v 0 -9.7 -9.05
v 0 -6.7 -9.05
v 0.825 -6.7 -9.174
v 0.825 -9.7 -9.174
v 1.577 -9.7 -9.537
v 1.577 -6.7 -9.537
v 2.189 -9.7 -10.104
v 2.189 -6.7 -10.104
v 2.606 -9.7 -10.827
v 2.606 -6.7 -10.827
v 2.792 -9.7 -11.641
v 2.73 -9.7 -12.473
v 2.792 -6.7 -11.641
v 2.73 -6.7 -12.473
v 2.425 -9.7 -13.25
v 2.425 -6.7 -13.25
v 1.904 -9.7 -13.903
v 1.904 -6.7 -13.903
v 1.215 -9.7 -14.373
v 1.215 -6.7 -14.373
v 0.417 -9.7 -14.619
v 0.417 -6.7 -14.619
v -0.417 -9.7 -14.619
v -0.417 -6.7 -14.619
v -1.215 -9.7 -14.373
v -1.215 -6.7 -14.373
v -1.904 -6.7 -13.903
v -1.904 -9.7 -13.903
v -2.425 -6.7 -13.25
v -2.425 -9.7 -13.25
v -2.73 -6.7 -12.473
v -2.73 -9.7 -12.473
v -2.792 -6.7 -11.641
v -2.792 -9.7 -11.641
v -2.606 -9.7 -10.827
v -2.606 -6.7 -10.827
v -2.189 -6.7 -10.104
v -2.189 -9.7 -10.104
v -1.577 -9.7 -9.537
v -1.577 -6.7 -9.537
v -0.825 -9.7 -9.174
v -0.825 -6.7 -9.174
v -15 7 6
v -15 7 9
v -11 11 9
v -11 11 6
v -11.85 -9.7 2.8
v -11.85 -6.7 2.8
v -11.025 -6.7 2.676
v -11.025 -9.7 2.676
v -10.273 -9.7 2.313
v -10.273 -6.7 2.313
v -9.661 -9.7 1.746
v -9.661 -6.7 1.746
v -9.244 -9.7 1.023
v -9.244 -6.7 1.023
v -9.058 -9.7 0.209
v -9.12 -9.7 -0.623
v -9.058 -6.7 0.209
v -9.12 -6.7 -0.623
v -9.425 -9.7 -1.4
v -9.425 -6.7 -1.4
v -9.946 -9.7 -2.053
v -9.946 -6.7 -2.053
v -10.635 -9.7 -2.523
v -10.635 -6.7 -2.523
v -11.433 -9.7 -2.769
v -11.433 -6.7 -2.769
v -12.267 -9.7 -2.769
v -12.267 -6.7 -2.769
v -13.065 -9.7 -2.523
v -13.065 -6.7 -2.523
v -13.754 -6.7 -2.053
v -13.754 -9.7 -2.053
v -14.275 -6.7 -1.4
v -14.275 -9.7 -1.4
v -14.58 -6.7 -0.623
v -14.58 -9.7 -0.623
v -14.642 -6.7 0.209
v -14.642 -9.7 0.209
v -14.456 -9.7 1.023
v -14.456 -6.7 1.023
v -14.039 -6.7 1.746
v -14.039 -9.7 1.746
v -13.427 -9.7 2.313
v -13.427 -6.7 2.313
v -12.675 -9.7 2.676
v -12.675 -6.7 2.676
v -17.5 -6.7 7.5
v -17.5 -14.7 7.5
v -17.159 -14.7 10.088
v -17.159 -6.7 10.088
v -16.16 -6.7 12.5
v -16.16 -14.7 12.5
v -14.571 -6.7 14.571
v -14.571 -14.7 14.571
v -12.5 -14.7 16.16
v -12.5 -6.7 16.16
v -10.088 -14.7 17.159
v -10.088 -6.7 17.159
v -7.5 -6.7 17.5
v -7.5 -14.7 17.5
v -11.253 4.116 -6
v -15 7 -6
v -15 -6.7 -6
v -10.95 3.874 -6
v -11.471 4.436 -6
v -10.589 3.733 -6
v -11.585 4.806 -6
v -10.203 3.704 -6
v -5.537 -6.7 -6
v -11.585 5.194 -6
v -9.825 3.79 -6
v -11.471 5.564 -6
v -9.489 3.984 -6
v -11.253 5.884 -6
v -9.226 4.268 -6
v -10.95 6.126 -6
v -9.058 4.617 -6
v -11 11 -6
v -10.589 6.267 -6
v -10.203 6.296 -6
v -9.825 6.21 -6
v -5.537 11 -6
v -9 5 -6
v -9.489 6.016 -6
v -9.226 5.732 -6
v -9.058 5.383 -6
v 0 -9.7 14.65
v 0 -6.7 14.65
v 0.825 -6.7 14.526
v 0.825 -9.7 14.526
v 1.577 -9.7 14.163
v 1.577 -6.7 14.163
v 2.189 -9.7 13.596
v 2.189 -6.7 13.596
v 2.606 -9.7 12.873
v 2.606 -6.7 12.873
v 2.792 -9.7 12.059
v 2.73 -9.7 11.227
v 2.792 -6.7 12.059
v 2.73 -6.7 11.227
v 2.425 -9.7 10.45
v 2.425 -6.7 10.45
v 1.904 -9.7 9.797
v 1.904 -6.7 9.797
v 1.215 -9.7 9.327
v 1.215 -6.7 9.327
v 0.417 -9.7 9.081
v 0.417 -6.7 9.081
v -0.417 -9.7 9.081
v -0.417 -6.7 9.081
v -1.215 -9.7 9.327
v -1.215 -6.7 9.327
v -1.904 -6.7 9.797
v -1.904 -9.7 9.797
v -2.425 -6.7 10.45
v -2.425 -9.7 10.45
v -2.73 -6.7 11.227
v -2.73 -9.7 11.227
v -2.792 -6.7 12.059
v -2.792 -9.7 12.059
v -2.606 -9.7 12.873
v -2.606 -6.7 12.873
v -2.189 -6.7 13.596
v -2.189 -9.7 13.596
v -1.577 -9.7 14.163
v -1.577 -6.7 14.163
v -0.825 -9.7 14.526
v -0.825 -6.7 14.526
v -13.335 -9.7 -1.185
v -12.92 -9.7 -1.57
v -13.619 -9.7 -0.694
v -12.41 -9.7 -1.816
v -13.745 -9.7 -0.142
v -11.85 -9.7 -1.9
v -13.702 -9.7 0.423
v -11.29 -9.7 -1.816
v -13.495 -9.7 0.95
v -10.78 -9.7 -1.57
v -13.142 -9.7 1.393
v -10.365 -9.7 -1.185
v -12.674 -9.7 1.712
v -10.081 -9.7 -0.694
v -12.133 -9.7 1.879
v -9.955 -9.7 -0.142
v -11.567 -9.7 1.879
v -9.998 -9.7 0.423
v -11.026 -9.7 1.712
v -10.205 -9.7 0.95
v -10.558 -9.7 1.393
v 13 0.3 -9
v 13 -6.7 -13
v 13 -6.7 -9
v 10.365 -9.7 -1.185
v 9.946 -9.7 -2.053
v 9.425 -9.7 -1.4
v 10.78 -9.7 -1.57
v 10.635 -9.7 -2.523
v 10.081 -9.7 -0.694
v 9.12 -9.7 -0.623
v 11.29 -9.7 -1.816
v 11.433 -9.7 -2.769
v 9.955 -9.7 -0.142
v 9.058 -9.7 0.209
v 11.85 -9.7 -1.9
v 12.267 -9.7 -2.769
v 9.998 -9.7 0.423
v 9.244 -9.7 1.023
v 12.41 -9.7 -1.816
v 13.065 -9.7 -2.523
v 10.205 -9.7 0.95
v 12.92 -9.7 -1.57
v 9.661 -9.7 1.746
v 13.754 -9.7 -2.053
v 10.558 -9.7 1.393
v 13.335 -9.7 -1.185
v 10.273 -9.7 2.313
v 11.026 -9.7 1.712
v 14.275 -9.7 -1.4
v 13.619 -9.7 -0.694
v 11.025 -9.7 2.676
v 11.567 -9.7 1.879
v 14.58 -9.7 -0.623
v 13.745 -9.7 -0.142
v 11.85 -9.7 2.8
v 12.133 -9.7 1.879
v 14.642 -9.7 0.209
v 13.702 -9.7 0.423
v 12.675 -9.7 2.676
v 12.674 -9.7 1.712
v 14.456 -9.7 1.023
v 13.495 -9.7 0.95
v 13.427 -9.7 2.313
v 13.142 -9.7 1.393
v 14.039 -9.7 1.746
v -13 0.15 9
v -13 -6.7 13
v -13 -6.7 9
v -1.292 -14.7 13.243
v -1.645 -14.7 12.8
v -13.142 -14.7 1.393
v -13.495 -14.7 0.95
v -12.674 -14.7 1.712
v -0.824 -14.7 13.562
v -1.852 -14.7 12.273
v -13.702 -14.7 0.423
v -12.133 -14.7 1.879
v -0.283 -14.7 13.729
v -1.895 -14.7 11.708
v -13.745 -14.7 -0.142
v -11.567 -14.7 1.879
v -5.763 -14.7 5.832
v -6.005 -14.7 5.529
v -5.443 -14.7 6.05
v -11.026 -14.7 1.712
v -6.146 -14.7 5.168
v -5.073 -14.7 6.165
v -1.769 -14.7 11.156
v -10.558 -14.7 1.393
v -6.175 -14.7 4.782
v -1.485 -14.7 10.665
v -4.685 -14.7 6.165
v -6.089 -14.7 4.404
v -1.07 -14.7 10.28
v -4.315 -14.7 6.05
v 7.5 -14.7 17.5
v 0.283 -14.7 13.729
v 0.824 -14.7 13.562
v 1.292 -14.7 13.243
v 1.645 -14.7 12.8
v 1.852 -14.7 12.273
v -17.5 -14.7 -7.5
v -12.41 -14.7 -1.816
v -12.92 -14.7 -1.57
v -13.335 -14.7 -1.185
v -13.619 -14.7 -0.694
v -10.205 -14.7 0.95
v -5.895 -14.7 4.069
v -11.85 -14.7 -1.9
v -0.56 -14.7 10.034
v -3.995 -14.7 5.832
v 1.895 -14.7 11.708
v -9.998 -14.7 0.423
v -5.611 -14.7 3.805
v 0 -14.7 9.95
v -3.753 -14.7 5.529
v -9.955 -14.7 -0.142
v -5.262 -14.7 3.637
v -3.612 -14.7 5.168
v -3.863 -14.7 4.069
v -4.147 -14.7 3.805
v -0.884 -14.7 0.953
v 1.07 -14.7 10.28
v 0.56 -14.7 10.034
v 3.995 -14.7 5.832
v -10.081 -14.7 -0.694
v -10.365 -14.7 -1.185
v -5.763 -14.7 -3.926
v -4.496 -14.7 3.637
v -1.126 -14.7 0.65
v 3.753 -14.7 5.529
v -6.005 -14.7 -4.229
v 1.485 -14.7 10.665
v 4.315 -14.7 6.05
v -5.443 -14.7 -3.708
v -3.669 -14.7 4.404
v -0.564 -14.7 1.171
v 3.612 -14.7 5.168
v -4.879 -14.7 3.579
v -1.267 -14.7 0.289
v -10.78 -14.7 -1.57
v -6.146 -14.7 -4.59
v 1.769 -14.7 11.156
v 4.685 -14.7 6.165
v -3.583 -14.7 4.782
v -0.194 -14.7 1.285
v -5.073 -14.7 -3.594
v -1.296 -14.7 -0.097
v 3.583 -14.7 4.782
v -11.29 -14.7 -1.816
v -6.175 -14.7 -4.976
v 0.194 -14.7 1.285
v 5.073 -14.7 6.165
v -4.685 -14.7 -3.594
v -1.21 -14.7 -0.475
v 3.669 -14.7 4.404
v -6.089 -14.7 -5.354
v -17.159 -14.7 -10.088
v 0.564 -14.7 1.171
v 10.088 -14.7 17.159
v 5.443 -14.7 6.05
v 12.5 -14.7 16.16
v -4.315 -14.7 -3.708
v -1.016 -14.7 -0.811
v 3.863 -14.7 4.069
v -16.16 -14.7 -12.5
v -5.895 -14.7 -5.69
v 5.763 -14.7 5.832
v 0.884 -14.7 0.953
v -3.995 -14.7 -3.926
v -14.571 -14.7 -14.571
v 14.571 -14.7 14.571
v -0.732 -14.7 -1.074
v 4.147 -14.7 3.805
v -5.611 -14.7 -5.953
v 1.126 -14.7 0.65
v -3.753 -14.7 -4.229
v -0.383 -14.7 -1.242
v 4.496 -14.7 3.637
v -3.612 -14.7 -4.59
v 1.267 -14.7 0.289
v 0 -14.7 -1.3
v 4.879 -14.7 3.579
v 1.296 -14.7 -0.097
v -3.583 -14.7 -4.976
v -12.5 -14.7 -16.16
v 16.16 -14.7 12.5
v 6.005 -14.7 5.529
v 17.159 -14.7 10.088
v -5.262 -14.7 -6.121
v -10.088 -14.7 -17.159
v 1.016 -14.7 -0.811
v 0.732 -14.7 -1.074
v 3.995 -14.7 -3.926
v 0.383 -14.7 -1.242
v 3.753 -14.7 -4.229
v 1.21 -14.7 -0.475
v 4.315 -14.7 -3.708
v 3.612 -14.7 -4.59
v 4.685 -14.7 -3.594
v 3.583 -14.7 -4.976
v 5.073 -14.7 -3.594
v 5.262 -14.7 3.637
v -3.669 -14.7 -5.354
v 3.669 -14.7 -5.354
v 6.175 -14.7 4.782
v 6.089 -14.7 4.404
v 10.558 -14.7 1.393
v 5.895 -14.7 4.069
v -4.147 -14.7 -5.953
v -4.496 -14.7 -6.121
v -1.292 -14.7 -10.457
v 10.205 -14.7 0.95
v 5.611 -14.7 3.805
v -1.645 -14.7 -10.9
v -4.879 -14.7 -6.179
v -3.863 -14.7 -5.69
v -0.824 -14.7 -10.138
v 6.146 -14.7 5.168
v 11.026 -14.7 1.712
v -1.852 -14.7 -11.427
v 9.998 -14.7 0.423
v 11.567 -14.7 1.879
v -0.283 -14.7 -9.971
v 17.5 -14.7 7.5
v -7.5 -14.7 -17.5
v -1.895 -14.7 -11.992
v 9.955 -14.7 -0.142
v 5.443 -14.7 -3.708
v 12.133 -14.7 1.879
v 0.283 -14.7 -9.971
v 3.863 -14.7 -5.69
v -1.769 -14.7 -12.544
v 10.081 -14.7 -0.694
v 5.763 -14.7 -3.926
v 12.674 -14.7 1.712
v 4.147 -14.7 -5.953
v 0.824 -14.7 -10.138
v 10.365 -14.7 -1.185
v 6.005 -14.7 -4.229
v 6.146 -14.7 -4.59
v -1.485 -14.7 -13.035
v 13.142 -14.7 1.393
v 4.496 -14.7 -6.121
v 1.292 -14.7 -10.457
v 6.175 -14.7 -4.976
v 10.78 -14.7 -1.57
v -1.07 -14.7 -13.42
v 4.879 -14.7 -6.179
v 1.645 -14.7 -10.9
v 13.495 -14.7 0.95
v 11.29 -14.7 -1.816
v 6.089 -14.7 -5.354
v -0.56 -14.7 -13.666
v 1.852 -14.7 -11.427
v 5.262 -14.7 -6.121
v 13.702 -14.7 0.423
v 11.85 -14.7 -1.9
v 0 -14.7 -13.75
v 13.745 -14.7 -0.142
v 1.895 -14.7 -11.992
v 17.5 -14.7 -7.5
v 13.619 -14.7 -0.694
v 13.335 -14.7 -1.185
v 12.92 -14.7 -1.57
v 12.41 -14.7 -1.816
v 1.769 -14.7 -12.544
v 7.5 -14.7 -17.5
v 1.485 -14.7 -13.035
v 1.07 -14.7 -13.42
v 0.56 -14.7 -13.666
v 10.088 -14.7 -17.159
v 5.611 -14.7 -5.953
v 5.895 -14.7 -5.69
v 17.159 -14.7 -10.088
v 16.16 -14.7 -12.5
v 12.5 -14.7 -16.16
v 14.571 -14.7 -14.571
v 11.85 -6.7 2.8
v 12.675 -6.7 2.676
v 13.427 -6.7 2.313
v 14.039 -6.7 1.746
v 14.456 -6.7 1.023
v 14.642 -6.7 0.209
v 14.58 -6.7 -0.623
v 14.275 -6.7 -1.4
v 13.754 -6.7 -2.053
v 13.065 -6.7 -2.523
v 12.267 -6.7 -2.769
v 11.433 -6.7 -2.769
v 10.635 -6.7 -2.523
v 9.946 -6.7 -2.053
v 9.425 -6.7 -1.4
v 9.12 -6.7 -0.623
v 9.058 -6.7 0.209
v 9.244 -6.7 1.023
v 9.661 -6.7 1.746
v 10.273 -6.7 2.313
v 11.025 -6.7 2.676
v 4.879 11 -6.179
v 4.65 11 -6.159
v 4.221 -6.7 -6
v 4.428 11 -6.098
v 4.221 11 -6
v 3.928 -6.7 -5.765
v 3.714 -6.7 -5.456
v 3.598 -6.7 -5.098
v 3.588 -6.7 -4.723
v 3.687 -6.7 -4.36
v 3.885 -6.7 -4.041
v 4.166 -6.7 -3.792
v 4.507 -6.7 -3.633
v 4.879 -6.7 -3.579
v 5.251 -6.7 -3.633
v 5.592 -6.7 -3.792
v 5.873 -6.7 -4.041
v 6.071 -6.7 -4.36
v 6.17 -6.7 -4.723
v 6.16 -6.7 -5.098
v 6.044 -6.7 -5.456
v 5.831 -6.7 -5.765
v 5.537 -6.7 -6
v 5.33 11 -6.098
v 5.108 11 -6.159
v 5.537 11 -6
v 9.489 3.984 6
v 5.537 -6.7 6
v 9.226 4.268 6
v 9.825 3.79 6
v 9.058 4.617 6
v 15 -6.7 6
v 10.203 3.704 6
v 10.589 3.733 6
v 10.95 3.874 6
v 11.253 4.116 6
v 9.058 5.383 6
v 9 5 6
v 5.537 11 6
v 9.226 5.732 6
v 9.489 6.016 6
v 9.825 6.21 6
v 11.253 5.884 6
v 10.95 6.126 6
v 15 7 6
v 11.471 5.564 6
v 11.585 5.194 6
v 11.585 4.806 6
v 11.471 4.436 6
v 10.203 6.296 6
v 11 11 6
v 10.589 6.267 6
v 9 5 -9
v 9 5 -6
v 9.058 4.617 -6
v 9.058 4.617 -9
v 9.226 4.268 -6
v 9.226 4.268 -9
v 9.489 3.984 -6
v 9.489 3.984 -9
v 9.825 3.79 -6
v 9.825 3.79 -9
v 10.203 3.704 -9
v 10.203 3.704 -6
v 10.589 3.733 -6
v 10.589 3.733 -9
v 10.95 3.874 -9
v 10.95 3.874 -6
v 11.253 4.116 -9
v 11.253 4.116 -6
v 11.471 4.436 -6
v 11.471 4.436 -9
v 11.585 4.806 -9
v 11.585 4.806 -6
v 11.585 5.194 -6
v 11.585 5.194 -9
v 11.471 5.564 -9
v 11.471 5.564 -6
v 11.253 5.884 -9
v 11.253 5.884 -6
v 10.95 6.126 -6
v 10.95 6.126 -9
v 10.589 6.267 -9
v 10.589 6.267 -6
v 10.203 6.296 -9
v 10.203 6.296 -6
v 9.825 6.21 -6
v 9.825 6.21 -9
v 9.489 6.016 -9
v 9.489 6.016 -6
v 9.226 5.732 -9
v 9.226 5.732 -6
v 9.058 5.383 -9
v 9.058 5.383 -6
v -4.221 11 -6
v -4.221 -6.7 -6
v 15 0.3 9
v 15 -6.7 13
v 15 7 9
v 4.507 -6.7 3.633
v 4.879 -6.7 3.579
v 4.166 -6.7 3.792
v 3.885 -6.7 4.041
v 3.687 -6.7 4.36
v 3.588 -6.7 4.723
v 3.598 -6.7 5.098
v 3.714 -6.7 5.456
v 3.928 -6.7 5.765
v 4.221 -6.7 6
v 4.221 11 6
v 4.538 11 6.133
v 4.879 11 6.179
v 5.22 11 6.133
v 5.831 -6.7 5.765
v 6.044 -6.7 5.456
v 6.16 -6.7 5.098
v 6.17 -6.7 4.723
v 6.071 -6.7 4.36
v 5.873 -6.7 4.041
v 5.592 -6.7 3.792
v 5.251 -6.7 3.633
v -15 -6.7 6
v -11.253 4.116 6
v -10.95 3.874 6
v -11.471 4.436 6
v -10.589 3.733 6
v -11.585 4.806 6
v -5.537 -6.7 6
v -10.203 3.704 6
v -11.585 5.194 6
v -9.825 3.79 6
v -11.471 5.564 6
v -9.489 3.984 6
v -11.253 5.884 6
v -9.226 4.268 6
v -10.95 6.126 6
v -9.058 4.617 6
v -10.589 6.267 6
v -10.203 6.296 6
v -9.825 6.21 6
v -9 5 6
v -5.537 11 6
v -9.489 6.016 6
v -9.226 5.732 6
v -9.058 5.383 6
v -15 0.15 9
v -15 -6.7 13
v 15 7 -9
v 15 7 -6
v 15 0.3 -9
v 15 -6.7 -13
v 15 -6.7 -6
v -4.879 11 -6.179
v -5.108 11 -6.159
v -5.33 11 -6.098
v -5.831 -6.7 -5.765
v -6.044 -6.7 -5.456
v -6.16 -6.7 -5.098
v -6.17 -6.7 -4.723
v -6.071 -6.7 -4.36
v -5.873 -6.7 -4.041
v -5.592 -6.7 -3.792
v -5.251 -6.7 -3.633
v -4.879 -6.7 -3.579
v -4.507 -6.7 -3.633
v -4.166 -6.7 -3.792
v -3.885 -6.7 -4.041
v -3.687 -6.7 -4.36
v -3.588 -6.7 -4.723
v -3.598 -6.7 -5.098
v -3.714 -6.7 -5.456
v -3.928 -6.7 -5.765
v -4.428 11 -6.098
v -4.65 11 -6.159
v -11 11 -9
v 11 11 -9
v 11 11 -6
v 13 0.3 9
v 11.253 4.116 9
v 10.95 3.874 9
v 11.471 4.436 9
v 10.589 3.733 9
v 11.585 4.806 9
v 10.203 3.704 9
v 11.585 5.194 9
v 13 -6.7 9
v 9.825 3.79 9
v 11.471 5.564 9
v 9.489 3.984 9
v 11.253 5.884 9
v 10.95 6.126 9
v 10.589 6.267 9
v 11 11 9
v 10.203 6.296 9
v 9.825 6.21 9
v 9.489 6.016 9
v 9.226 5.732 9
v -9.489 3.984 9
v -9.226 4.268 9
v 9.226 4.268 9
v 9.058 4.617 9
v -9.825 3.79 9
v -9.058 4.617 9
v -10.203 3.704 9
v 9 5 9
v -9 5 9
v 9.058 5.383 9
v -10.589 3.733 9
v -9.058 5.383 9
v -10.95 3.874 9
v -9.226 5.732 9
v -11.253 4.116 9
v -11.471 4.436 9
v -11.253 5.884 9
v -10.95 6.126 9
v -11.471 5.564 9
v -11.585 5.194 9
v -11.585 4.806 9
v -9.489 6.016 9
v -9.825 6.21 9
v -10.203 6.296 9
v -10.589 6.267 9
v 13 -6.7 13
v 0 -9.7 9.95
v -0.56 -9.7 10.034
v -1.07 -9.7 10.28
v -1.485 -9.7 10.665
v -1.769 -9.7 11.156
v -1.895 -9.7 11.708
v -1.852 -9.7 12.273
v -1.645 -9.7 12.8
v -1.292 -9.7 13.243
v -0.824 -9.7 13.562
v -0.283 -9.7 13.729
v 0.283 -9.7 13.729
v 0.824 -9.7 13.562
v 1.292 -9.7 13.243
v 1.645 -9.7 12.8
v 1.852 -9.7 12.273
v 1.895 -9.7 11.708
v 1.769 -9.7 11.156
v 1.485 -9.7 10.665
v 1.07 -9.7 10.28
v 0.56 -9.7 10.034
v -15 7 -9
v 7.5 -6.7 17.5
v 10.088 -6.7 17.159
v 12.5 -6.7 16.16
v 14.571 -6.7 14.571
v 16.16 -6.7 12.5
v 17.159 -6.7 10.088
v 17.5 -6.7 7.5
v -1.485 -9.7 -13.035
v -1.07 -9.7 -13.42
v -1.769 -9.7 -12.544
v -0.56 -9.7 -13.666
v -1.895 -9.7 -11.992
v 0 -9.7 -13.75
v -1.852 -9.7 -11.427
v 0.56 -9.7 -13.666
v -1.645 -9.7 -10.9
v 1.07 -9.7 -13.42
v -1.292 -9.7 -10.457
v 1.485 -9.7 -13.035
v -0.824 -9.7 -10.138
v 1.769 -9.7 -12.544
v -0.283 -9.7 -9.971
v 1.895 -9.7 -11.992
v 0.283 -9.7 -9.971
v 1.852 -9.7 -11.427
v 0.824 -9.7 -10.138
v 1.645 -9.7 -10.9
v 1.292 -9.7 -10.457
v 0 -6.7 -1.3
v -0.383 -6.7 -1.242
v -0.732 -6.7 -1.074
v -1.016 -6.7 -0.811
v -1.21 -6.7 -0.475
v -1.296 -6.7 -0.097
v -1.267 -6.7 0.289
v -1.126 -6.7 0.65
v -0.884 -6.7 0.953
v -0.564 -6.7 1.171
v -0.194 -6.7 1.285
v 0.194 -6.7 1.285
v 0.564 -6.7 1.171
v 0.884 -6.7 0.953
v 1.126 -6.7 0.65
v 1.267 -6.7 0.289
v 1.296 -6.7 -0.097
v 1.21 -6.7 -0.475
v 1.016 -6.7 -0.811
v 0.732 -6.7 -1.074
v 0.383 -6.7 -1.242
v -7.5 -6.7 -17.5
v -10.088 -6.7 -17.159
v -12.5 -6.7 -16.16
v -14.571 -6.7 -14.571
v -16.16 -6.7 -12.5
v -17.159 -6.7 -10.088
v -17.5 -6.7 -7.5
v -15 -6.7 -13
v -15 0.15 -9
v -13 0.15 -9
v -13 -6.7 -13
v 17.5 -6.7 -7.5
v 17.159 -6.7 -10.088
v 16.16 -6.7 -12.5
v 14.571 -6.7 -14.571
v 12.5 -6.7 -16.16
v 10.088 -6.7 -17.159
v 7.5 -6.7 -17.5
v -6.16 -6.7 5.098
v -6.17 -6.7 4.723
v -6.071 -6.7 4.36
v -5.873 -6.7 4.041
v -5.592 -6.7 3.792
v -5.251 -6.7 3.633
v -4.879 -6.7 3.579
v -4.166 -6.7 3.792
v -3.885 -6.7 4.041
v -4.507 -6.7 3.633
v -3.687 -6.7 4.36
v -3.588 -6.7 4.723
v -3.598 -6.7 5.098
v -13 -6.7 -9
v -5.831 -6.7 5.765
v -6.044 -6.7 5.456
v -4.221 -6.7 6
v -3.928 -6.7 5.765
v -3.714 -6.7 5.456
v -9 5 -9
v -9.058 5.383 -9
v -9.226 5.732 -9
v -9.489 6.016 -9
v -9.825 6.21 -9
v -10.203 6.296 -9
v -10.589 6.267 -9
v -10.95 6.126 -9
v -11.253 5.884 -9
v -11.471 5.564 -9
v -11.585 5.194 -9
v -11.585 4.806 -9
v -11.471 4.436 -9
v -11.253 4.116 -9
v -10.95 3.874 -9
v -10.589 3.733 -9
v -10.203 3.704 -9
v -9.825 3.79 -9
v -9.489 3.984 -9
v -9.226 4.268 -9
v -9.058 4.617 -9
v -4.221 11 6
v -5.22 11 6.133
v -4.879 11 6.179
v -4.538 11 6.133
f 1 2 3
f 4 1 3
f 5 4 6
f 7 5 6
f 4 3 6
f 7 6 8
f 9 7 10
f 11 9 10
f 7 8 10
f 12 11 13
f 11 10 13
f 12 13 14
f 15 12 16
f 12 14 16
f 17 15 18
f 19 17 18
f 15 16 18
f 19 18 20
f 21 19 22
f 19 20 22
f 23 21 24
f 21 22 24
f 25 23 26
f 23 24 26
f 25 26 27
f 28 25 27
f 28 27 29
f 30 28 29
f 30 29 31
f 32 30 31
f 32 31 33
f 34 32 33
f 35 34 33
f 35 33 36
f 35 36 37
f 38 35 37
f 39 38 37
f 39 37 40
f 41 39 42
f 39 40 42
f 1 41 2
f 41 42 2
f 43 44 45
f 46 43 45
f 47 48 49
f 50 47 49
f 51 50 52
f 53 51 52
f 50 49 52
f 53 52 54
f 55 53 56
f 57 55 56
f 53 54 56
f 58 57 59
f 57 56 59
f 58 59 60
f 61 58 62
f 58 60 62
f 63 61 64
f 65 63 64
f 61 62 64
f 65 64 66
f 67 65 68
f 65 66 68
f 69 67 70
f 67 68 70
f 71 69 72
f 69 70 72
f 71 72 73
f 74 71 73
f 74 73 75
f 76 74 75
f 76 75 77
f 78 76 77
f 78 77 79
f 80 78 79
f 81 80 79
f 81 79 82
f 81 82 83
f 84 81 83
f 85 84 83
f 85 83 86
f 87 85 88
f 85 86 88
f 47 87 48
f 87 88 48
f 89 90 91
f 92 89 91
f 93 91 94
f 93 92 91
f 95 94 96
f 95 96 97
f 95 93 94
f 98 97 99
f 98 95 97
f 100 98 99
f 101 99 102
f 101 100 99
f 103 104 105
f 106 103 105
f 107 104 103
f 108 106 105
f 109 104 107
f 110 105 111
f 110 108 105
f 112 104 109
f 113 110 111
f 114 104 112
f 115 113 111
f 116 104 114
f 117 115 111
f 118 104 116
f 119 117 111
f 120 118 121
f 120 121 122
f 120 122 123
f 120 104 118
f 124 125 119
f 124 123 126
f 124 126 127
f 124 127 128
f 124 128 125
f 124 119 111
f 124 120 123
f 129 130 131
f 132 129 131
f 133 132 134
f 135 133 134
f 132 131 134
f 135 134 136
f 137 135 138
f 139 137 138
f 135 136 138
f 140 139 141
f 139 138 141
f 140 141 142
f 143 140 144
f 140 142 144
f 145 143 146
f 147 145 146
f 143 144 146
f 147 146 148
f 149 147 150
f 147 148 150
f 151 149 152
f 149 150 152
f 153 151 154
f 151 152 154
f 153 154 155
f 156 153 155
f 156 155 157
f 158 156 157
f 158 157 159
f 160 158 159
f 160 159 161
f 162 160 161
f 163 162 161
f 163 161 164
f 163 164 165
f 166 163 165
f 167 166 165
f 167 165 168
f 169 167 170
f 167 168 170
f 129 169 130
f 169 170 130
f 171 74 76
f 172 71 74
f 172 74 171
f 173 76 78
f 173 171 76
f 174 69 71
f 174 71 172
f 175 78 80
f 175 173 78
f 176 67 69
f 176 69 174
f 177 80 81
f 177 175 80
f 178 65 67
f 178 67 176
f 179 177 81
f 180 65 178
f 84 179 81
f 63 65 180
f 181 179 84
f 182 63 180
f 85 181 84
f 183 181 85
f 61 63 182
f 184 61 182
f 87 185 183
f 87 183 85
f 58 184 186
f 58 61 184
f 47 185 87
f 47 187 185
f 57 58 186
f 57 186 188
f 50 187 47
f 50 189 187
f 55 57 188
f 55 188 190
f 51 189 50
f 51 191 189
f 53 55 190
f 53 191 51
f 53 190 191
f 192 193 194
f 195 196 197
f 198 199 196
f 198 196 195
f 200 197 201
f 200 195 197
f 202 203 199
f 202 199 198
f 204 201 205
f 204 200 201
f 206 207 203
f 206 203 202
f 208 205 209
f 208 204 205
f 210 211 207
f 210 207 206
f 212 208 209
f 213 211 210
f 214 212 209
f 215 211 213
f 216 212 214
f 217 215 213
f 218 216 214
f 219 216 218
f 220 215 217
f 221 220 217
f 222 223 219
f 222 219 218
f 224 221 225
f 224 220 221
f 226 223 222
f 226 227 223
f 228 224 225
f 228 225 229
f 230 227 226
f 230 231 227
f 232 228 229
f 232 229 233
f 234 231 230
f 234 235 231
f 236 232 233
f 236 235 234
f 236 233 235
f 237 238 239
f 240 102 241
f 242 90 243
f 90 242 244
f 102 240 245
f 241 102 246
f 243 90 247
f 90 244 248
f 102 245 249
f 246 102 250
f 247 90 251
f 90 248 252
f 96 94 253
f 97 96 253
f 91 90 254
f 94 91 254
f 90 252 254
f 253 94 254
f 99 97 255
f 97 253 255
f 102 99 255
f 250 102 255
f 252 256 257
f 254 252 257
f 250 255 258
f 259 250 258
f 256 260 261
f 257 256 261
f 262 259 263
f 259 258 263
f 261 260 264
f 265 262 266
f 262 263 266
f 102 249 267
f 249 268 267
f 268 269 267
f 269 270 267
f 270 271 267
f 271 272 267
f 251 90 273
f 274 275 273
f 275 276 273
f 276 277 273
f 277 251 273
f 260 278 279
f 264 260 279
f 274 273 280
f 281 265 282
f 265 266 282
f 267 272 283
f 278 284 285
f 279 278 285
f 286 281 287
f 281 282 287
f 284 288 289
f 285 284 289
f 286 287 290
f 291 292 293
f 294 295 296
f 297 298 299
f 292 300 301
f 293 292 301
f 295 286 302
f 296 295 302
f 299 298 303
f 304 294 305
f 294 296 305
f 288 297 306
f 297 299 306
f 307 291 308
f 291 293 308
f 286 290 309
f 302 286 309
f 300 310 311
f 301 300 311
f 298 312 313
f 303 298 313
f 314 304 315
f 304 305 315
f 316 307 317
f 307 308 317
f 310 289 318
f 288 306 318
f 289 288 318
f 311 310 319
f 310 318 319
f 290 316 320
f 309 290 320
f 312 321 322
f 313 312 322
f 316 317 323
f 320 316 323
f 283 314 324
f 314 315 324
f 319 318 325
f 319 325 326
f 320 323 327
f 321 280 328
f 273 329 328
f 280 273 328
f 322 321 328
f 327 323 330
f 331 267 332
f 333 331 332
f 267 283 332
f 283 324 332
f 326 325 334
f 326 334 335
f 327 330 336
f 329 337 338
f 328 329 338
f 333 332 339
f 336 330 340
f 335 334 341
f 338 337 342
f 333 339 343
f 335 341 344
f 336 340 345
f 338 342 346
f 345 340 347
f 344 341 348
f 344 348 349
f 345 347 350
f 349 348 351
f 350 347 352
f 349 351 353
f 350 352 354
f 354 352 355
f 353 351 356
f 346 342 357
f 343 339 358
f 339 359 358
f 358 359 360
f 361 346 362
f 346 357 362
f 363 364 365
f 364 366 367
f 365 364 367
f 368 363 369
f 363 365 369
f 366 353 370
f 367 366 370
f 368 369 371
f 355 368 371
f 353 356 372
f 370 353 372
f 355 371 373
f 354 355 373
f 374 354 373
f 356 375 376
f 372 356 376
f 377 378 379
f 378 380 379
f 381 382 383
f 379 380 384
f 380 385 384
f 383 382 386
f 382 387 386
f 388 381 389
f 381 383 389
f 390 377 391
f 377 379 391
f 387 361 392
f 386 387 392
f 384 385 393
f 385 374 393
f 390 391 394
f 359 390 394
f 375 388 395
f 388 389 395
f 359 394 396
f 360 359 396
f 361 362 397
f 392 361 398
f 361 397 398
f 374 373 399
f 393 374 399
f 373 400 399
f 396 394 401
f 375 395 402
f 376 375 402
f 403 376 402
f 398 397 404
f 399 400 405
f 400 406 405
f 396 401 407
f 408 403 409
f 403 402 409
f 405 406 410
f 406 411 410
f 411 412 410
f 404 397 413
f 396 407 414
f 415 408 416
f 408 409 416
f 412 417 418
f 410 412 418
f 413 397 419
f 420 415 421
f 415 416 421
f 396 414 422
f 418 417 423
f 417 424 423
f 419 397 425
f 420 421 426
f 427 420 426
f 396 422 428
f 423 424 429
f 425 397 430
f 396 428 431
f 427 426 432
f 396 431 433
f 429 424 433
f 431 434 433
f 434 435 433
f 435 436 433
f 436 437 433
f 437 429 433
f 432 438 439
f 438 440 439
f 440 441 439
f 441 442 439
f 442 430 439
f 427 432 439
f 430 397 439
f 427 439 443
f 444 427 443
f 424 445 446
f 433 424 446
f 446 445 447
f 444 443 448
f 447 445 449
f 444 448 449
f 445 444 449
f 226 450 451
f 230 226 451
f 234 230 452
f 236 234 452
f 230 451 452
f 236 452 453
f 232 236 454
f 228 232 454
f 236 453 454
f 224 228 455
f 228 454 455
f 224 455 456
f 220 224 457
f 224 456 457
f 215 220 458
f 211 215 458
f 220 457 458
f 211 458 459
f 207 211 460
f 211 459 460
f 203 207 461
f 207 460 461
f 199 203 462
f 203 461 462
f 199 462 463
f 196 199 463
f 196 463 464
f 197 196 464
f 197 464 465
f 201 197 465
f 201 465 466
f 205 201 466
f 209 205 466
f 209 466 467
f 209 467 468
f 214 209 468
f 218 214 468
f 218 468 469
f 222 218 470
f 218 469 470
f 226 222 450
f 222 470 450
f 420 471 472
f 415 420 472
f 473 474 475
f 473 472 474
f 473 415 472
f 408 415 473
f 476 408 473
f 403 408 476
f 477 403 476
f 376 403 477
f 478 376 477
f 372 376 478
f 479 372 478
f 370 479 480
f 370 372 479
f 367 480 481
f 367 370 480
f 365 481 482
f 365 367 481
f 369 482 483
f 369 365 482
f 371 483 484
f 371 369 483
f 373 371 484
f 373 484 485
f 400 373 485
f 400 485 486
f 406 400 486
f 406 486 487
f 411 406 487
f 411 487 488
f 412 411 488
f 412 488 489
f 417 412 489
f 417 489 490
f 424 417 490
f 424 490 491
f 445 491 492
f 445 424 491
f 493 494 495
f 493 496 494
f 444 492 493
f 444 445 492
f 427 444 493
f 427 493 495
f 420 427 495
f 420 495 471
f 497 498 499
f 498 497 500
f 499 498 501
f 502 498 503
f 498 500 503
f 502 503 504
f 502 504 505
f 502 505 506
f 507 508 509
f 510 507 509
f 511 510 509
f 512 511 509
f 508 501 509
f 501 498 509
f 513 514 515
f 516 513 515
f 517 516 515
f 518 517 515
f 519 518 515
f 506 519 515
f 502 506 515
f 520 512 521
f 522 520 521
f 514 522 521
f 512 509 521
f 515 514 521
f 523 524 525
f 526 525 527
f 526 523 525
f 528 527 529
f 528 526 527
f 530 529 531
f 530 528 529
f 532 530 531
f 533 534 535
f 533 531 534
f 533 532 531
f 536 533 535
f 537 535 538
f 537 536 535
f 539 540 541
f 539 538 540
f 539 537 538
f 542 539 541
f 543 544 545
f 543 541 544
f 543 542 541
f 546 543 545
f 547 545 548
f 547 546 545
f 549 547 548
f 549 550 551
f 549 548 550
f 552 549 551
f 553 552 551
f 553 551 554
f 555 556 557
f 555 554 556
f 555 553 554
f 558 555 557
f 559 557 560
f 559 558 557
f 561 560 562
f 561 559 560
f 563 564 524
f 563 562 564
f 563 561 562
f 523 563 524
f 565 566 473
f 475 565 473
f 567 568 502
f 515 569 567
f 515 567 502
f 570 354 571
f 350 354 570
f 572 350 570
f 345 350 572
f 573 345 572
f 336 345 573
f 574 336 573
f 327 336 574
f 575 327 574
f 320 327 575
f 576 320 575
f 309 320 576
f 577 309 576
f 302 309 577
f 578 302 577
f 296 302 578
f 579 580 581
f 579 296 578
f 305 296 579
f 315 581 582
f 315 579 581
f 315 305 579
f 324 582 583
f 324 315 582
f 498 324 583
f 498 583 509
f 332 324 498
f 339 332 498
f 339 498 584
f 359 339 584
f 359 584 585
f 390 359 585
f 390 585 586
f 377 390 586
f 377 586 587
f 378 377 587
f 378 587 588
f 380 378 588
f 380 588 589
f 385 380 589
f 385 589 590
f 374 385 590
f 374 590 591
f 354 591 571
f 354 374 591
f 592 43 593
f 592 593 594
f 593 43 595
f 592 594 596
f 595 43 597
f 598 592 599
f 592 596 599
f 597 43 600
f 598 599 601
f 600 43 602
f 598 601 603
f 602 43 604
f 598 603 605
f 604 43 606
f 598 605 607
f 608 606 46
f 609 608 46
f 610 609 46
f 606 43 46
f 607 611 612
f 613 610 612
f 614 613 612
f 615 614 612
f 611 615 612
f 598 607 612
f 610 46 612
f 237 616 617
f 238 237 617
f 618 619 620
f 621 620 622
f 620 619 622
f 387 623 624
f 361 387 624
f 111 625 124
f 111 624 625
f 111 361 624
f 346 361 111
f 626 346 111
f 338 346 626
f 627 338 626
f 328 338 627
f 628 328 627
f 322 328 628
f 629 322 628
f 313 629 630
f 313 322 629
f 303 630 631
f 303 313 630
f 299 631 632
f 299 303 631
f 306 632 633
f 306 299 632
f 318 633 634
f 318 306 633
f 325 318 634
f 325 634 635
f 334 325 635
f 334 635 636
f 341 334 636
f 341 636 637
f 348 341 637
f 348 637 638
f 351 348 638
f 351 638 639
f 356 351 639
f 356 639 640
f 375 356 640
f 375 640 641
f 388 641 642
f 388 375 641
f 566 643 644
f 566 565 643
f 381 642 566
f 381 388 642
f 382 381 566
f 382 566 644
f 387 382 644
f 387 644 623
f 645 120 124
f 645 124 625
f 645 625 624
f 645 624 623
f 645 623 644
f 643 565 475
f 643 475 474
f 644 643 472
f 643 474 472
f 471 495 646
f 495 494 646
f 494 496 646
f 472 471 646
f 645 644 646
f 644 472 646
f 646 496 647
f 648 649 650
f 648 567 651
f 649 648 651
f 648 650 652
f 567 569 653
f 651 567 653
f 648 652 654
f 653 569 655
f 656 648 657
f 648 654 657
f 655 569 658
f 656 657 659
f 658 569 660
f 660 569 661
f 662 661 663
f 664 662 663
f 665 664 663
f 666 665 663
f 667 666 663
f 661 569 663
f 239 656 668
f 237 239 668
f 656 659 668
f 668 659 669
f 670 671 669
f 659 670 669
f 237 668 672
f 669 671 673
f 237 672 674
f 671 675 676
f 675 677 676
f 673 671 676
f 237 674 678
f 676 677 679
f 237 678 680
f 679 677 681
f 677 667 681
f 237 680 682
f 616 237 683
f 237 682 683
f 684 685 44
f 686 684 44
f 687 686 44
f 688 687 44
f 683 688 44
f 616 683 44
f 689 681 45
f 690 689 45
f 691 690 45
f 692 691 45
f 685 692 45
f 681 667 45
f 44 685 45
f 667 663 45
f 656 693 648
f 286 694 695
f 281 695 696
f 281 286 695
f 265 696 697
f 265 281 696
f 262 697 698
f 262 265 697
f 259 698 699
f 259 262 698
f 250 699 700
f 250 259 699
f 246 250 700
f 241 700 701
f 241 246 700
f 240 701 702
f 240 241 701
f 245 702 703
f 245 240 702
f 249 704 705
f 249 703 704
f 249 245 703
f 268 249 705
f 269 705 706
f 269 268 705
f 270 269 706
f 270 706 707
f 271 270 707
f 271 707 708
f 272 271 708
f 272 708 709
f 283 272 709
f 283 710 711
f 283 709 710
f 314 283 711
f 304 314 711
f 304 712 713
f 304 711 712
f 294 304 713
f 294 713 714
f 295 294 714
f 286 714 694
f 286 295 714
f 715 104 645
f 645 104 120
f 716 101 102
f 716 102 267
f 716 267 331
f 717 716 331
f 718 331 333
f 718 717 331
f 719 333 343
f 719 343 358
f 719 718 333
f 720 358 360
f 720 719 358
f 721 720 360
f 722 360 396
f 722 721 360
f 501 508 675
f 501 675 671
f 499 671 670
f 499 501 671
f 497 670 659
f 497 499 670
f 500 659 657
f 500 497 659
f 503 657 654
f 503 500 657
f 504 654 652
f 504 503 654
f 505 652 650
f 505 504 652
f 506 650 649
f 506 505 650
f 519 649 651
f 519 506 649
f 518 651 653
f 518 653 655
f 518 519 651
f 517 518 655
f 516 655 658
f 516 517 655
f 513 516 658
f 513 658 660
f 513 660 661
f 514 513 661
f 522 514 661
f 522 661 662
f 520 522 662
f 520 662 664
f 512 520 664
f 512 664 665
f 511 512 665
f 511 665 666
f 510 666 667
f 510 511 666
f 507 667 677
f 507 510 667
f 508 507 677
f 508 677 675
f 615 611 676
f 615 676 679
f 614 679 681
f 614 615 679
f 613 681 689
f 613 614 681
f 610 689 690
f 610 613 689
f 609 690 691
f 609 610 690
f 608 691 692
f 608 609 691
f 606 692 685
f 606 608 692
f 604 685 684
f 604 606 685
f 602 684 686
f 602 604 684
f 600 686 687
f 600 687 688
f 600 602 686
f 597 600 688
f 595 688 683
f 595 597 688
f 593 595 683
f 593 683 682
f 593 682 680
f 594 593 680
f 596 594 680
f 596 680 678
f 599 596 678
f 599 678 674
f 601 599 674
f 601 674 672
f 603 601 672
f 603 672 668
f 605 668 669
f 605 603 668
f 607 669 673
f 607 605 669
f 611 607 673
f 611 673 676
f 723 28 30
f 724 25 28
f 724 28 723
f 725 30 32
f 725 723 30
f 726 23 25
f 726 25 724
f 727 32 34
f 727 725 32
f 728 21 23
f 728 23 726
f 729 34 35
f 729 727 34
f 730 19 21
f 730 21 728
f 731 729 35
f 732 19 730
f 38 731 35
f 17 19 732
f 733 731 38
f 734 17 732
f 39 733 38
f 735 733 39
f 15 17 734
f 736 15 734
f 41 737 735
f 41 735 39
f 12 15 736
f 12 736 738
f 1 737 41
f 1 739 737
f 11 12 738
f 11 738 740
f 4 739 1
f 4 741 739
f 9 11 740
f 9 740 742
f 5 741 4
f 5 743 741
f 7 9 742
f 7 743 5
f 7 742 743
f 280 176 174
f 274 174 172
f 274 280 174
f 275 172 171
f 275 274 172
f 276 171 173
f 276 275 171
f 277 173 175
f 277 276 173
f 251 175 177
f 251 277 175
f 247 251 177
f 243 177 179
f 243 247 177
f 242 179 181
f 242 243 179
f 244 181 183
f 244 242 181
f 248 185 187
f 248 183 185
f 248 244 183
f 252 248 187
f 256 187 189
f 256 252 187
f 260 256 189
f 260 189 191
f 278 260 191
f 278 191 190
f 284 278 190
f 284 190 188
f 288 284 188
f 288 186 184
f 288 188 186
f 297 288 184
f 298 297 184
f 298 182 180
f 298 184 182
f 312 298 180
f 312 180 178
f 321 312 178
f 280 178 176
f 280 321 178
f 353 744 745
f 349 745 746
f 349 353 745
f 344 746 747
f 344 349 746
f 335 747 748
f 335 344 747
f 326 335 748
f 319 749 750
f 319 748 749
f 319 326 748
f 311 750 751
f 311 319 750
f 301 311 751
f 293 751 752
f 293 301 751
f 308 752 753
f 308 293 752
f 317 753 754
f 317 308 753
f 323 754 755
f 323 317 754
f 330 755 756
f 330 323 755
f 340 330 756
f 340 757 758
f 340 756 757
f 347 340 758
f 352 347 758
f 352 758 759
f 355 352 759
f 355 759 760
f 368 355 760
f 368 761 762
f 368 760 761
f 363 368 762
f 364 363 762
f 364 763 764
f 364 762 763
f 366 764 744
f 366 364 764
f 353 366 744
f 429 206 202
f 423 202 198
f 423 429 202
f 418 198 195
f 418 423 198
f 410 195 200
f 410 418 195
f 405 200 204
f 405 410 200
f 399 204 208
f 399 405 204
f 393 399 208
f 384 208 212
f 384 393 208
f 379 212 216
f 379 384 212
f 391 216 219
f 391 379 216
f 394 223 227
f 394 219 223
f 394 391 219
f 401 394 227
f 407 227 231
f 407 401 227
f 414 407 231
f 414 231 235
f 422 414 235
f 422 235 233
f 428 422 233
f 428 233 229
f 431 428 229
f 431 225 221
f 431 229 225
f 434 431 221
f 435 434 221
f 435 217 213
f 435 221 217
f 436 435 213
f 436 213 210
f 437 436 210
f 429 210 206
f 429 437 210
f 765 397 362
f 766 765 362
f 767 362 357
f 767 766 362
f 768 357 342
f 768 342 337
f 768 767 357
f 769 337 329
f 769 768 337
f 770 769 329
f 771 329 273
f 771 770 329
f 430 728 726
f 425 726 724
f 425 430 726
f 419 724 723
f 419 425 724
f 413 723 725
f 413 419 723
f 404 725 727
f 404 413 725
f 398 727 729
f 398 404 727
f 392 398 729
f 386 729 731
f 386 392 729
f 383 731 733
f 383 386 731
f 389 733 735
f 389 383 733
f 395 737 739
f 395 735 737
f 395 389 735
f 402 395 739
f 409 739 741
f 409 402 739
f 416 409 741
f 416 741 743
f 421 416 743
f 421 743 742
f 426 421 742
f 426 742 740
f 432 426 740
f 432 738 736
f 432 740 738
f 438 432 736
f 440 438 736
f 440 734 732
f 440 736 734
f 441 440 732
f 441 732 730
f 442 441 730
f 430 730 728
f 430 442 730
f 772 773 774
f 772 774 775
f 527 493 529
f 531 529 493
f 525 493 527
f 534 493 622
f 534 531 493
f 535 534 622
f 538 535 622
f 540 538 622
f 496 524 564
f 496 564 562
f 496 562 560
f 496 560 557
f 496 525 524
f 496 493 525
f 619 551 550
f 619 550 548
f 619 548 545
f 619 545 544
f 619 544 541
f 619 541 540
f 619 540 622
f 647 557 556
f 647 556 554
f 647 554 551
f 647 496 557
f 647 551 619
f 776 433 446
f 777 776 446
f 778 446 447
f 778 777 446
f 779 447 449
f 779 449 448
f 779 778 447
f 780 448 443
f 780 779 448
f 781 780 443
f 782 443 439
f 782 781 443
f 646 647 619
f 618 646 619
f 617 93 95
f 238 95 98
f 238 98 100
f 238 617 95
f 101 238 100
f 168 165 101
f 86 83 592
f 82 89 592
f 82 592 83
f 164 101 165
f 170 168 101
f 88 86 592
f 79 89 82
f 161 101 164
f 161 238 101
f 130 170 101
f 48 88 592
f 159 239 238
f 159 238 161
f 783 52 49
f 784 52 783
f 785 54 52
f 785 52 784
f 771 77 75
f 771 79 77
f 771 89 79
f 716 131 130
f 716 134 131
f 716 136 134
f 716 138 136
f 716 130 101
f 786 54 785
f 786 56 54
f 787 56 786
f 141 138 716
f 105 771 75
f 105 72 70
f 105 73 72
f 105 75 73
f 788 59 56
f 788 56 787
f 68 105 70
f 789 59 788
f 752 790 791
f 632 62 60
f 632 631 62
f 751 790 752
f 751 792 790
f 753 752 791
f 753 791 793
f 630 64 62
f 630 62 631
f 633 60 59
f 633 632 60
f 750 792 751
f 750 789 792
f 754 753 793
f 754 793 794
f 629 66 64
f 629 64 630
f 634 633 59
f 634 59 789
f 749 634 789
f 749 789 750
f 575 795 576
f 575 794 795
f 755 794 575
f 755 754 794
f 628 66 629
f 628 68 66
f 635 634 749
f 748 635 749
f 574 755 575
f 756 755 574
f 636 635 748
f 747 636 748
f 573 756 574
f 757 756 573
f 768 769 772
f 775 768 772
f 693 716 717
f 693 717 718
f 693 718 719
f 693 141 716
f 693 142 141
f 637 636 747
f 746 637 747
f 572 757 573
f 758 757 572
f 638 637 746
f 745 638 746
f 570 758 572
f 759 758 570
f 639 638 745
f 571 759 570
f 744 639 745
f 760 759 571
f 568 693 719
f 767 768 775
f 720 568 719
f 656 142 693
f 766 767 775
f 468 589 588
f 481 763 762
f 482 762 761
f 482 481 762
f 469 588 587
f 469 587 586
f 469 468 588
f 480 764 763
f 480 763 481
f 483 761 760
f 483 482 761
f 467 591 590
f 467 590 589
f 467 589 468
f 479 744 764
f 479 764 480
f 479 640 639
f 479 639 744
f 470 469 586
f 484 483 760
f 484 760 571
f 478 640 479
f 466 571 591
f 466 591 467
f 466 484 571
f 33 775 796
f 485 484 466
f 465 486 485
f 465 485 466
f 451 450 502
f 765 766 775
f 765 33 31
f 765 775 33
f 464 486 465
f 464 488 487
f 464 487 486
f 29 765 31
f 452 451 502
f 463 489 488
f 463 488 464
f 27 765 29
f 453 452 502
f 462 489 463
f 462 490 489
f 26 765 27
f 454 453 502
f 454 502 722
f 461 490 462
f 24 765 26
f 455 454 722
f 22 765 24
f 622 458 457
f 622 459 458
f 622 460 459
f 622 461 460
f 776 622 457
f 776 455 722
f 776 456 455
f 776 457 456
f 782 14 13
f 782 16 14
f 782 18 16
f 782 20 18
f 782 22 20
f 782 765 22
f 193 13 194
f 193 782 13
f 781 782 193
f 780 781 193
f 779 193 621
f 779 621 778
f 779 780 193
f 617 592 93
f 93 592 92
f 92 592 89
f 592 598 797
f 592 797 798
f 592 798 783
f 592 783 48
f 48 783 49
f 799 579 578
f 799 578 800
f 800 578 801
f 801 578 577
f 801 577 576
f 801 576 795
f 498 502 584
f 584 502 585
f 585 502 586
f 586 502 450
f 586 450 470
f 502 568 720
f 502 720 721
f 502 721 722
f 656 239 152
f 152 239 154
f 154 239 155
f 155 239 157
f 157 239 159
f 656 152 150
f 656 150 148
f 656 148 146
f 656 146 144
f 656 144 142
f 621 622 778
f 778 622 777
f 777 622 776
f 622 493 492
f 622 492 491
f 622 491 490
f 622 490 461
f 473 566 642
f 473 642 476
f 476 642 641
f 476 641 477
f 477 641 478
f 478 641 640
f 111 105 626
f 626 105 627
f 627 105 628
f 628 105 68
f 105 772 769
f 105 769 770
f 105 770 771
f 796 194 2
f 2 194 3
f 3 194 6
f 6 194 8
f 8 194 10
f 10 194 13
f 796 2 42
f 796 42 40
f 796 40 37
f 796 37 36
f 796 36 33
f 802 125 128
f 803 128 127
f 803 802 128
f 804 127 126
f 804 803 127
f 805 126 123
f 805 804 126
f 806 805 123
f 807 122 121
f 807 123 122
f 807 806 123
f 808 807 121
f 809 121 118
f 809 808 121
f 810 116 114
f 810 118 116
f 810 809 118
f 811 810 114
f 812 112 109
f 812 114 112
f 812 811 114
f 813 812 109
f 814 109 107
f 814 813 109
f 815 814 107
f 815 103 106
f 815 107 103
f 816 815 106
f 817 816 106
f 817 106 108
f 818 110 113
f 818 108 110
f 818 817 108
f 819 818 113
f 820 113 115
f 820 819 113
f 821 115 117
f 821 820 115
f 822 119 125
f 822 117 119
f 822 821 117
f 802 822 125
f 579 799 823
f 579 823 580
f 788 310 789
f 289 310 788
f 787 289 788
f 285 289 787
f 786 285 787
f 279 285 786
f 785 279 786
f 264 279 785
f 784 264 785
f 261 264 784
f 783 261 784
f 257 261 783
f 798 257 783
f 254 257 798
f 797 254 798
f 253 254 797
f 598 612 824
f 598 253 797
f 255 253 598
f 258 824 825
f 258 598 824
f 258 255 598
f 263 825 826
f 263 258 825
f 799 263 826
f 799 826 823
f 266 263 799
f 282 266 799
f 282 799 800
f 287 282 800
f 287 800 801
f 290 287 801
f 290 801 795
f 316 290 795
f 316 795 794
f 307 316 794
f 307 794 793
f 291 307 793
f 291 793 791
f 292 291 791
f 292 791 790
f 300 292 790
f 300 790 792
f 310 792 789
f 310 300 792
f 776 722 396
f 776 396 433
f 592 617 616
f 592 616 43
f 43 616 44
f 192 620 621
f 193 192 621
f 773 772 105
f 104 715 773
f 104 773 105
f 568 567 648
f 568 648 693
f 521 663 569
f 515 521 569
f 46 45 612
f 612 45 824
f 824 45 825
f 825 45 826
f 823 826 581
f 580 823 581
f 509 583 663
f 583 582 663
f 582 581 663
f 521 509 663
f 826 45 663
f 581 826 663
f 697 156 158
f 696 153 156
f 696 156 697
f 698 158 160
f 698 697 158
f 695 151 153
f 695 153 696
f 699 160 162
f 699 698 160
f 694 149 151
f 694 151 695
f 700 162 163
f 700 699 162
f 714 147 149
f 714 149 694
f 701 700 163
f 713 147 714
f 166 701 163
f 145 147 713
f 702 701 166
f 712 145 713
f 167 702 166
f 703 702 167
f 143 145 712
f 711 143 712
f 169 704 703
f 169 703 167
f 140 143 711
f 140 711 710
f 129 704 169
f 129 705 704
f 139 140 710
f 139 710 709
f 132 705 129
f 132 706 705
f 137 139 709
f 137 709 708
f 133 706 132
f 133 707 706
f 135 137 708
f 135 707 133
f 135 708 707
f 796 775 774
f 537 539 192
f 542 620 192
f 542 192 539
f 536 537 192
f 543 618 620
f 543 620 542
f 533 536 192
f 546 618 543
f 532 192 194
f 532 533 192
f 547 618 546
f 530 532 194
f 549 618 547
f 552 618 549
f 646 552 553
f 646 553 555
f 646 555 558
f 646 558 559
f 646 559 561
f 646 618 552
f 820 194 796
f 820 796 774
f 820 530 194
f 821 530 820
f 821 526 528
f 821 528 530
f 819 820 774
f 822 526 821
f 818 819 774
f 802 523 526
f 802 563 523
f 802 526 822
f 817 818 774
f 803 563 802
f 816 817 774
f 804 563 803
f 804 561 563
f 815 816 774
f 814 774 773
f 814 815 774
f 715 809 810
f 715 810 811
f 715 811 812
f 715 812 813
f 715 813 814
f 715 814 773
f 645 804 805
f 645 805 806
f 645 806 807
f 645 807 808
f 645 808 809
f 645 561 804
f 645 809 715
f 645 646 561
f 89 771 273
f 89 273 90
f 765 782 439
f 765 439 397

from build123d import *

# Parameters (mm, degrees)
SKETCH_2_R          = 1.3
EXTRUDE_1_DEPTH     = 9
SKETCH_3_W          = 30
SKETCH_3_H          = 20.835575778
CUT_EXTRUDE_1_DEPTH = 6
EXTRUDE_START       = -6.7
EXTRUDE_2_DEPTH     = 8
CUT_EXTRUDE_START   = -14.7
SKETCH_5_R          = 1.3
SKETCH_5_R_2        = 1.9
CUT_EXTRUDE_2_DEPTH = 30
EXTRUDE_3_DEPTH     = 2
EXTRUDE_4_DEPTH     = 2
SKETCH_11_R         = 2.8
CUT_EXTRUDE_3_DEPTH = 3


with BuildPart() as part:
    # 草图2 → 凸台-拉伸1 (new, symmetric)
    with BuildSketch(Plane.XY):
        Polygon((-11, 11), (11, 11), (15, 7), (15, -11), (-15, -11), (-15, 7), align=None)
        with Locations((-10.3, 5)):
            Circle(SKETCH_2_R, mode=Mode.SUBTRACT)
        with Locations(Location((10.3, 5, 0), (0, 0, 180))):
            Circle(SKETCH_2_R, mode=Mode.SUBTRACT)
    extrude(amount=EXTRUDE_1_DEPTH, both=True)

    # 草图3 → 切除-拉伸1 (cut, symmetric)
    with BuildSketch(Plane.XY):
        with Locations((0, 3.717787889)):
            Rectangle(SKETCH_3_W, SKETCH_3_H)
    extrude(amount=CUT_EXTRUDE_1_DEPTH, both=True, mode=Mode.SUBTRACT)

    # 草图6 → 凸台-拉伸2 (add)
    with BuildSketch(Plane(origin=(0, 0, 0), x_dir=(1, 0, 0), z_dir=(0, 1, 0)).offset(EXTRUDE_START)):
        with BuildLine():
            Line((-7.5, -17.5), (7.5, -17.5))
            ThreePointArc((7.5, -17.5), (14.571067812, -14.571067812), (17.5, -7.5))
            Line((17.5, -7.5), (17.5, 7.5))
            ThreePointArc((17.5, 7.5), (14.571067812, 14.571067812), (7.5, 17.5))
            Line((7.5, 17.5), (-7.5, 17.5))
            ThreePointArc((-7.5, 17.5), (-14.571067812, 14.571067812), (-17.5, 7.5))
            Line((-17.5, 7.5), (-17.5, -7.5))
            ThreePointArc((-17.5, -7.5), (-14.571067812, -14.571067812), (-7.5, -17.5))
        make_face()
    extrude(amount=-EXTRUDE_2_DEPTH)

    # 草图5 → 切除-拉伸2 (cut)
    with BuildSketch(Plane(origin=(0, 0, 0), x_dir=(1, 0, 0), z_dir=(0, 1, 0)).offset(CUT_EXTRUDE_START)):
        with Locations(Location((0, 0, 0), (0, 0, 90))):
            Circle(SKETCH_5_R)
        with Locations(Location((-4.87903679, 4.87903679, 0), (0, 0, 90))):
            Circle(SKETCH_5_R)
        with Locations(Location((-11.85, 0, 0), (0, 0, 90))):
            Circle(SKETCH_5_R_2)
        with Locations(Location((0, 11.85, 0), (0, 0, 90))):
            Circle(SKETCH_5_R_2)
        with Locations(Location((4.87903679, 4.87903679, 0), (0, 0, 90))):
            Circle(SKETCH_5_R)
        with Locations(Location((11.85, 0, 0), (0, 0, 90))):
            Circle(SKETCH_5_R_2)
        with Locations(Location((4.87903679, -4.87903679, 0), (0, 0, 90))):
            Circle(SKETCH_5_R)
        with Locations(Location((0, -11.85, 0), (0, 0, 90))):
            Circle(SKETCH_5_R_2)
        with Locations(Location((-4.87903679, -4.87903679, 0), (0, 0, 90))):
            Circle(SKETCH_5_R)
    extrude(amount=CUT_EXTRUDE_2_DEPTH, mode=Mode.SUBTRACT)

    # 草图7 → 凸台-拉伸3 (add)
    with BuildSketch(Plane(origin=(15, 0, 0), x_dir=(0, 0, -1), z_dir=(1, 0, 0))):
        Polygon((-9, 0.3), (-13, -6.7), (-9, -6.7), align=None)
        Polygon((9, -6.7), (9, 0.3), (13, -6.7), align=None)
    extrude(amount=-EXTRUDE_3_DEPTH)

    # 草图10 → 凸台-拉伸4 (add)
    with BuildSketch(Plane.ZY.offset(15)):
        Polygon((-9, 0.15), (-13, -6.7), (-9, -6.7), align=None)
        Polygon((9, -6.7), (9, 0.15), (13, -6.7), align=None)
    extrude(amount=-EXTRUDE_4_DEPTH)

    # 草图11 → 切除-拉伸3 (cut)
    with BuildSketch(Plane(origin=(0, -6.7, 0), x_dir=(1, 0, 0), z_dir=(0, 1, 0))):
        with Locations(Location((0, 11.85, 0), (0, 0, 270))):
            Circle(SKETCH_11_R)
        with Locations(Location((11.85, 0, 0), (0, 0, 270))):
            Circle(SKETCH_11_R)
        with Locations(Location((0, -11.85, 0), (0, 0, 270))):
            Circle(SKETCH_11_R)
        with Locations(Location((-11.85, 0, 0), (0, 0, 270))):
            Circle(SKETCH_11_R)
    extrude(amount=-CUT_EXTRUDE_3_DEPTH, mode=Mode.SUBTRACT)


solid = part.part
